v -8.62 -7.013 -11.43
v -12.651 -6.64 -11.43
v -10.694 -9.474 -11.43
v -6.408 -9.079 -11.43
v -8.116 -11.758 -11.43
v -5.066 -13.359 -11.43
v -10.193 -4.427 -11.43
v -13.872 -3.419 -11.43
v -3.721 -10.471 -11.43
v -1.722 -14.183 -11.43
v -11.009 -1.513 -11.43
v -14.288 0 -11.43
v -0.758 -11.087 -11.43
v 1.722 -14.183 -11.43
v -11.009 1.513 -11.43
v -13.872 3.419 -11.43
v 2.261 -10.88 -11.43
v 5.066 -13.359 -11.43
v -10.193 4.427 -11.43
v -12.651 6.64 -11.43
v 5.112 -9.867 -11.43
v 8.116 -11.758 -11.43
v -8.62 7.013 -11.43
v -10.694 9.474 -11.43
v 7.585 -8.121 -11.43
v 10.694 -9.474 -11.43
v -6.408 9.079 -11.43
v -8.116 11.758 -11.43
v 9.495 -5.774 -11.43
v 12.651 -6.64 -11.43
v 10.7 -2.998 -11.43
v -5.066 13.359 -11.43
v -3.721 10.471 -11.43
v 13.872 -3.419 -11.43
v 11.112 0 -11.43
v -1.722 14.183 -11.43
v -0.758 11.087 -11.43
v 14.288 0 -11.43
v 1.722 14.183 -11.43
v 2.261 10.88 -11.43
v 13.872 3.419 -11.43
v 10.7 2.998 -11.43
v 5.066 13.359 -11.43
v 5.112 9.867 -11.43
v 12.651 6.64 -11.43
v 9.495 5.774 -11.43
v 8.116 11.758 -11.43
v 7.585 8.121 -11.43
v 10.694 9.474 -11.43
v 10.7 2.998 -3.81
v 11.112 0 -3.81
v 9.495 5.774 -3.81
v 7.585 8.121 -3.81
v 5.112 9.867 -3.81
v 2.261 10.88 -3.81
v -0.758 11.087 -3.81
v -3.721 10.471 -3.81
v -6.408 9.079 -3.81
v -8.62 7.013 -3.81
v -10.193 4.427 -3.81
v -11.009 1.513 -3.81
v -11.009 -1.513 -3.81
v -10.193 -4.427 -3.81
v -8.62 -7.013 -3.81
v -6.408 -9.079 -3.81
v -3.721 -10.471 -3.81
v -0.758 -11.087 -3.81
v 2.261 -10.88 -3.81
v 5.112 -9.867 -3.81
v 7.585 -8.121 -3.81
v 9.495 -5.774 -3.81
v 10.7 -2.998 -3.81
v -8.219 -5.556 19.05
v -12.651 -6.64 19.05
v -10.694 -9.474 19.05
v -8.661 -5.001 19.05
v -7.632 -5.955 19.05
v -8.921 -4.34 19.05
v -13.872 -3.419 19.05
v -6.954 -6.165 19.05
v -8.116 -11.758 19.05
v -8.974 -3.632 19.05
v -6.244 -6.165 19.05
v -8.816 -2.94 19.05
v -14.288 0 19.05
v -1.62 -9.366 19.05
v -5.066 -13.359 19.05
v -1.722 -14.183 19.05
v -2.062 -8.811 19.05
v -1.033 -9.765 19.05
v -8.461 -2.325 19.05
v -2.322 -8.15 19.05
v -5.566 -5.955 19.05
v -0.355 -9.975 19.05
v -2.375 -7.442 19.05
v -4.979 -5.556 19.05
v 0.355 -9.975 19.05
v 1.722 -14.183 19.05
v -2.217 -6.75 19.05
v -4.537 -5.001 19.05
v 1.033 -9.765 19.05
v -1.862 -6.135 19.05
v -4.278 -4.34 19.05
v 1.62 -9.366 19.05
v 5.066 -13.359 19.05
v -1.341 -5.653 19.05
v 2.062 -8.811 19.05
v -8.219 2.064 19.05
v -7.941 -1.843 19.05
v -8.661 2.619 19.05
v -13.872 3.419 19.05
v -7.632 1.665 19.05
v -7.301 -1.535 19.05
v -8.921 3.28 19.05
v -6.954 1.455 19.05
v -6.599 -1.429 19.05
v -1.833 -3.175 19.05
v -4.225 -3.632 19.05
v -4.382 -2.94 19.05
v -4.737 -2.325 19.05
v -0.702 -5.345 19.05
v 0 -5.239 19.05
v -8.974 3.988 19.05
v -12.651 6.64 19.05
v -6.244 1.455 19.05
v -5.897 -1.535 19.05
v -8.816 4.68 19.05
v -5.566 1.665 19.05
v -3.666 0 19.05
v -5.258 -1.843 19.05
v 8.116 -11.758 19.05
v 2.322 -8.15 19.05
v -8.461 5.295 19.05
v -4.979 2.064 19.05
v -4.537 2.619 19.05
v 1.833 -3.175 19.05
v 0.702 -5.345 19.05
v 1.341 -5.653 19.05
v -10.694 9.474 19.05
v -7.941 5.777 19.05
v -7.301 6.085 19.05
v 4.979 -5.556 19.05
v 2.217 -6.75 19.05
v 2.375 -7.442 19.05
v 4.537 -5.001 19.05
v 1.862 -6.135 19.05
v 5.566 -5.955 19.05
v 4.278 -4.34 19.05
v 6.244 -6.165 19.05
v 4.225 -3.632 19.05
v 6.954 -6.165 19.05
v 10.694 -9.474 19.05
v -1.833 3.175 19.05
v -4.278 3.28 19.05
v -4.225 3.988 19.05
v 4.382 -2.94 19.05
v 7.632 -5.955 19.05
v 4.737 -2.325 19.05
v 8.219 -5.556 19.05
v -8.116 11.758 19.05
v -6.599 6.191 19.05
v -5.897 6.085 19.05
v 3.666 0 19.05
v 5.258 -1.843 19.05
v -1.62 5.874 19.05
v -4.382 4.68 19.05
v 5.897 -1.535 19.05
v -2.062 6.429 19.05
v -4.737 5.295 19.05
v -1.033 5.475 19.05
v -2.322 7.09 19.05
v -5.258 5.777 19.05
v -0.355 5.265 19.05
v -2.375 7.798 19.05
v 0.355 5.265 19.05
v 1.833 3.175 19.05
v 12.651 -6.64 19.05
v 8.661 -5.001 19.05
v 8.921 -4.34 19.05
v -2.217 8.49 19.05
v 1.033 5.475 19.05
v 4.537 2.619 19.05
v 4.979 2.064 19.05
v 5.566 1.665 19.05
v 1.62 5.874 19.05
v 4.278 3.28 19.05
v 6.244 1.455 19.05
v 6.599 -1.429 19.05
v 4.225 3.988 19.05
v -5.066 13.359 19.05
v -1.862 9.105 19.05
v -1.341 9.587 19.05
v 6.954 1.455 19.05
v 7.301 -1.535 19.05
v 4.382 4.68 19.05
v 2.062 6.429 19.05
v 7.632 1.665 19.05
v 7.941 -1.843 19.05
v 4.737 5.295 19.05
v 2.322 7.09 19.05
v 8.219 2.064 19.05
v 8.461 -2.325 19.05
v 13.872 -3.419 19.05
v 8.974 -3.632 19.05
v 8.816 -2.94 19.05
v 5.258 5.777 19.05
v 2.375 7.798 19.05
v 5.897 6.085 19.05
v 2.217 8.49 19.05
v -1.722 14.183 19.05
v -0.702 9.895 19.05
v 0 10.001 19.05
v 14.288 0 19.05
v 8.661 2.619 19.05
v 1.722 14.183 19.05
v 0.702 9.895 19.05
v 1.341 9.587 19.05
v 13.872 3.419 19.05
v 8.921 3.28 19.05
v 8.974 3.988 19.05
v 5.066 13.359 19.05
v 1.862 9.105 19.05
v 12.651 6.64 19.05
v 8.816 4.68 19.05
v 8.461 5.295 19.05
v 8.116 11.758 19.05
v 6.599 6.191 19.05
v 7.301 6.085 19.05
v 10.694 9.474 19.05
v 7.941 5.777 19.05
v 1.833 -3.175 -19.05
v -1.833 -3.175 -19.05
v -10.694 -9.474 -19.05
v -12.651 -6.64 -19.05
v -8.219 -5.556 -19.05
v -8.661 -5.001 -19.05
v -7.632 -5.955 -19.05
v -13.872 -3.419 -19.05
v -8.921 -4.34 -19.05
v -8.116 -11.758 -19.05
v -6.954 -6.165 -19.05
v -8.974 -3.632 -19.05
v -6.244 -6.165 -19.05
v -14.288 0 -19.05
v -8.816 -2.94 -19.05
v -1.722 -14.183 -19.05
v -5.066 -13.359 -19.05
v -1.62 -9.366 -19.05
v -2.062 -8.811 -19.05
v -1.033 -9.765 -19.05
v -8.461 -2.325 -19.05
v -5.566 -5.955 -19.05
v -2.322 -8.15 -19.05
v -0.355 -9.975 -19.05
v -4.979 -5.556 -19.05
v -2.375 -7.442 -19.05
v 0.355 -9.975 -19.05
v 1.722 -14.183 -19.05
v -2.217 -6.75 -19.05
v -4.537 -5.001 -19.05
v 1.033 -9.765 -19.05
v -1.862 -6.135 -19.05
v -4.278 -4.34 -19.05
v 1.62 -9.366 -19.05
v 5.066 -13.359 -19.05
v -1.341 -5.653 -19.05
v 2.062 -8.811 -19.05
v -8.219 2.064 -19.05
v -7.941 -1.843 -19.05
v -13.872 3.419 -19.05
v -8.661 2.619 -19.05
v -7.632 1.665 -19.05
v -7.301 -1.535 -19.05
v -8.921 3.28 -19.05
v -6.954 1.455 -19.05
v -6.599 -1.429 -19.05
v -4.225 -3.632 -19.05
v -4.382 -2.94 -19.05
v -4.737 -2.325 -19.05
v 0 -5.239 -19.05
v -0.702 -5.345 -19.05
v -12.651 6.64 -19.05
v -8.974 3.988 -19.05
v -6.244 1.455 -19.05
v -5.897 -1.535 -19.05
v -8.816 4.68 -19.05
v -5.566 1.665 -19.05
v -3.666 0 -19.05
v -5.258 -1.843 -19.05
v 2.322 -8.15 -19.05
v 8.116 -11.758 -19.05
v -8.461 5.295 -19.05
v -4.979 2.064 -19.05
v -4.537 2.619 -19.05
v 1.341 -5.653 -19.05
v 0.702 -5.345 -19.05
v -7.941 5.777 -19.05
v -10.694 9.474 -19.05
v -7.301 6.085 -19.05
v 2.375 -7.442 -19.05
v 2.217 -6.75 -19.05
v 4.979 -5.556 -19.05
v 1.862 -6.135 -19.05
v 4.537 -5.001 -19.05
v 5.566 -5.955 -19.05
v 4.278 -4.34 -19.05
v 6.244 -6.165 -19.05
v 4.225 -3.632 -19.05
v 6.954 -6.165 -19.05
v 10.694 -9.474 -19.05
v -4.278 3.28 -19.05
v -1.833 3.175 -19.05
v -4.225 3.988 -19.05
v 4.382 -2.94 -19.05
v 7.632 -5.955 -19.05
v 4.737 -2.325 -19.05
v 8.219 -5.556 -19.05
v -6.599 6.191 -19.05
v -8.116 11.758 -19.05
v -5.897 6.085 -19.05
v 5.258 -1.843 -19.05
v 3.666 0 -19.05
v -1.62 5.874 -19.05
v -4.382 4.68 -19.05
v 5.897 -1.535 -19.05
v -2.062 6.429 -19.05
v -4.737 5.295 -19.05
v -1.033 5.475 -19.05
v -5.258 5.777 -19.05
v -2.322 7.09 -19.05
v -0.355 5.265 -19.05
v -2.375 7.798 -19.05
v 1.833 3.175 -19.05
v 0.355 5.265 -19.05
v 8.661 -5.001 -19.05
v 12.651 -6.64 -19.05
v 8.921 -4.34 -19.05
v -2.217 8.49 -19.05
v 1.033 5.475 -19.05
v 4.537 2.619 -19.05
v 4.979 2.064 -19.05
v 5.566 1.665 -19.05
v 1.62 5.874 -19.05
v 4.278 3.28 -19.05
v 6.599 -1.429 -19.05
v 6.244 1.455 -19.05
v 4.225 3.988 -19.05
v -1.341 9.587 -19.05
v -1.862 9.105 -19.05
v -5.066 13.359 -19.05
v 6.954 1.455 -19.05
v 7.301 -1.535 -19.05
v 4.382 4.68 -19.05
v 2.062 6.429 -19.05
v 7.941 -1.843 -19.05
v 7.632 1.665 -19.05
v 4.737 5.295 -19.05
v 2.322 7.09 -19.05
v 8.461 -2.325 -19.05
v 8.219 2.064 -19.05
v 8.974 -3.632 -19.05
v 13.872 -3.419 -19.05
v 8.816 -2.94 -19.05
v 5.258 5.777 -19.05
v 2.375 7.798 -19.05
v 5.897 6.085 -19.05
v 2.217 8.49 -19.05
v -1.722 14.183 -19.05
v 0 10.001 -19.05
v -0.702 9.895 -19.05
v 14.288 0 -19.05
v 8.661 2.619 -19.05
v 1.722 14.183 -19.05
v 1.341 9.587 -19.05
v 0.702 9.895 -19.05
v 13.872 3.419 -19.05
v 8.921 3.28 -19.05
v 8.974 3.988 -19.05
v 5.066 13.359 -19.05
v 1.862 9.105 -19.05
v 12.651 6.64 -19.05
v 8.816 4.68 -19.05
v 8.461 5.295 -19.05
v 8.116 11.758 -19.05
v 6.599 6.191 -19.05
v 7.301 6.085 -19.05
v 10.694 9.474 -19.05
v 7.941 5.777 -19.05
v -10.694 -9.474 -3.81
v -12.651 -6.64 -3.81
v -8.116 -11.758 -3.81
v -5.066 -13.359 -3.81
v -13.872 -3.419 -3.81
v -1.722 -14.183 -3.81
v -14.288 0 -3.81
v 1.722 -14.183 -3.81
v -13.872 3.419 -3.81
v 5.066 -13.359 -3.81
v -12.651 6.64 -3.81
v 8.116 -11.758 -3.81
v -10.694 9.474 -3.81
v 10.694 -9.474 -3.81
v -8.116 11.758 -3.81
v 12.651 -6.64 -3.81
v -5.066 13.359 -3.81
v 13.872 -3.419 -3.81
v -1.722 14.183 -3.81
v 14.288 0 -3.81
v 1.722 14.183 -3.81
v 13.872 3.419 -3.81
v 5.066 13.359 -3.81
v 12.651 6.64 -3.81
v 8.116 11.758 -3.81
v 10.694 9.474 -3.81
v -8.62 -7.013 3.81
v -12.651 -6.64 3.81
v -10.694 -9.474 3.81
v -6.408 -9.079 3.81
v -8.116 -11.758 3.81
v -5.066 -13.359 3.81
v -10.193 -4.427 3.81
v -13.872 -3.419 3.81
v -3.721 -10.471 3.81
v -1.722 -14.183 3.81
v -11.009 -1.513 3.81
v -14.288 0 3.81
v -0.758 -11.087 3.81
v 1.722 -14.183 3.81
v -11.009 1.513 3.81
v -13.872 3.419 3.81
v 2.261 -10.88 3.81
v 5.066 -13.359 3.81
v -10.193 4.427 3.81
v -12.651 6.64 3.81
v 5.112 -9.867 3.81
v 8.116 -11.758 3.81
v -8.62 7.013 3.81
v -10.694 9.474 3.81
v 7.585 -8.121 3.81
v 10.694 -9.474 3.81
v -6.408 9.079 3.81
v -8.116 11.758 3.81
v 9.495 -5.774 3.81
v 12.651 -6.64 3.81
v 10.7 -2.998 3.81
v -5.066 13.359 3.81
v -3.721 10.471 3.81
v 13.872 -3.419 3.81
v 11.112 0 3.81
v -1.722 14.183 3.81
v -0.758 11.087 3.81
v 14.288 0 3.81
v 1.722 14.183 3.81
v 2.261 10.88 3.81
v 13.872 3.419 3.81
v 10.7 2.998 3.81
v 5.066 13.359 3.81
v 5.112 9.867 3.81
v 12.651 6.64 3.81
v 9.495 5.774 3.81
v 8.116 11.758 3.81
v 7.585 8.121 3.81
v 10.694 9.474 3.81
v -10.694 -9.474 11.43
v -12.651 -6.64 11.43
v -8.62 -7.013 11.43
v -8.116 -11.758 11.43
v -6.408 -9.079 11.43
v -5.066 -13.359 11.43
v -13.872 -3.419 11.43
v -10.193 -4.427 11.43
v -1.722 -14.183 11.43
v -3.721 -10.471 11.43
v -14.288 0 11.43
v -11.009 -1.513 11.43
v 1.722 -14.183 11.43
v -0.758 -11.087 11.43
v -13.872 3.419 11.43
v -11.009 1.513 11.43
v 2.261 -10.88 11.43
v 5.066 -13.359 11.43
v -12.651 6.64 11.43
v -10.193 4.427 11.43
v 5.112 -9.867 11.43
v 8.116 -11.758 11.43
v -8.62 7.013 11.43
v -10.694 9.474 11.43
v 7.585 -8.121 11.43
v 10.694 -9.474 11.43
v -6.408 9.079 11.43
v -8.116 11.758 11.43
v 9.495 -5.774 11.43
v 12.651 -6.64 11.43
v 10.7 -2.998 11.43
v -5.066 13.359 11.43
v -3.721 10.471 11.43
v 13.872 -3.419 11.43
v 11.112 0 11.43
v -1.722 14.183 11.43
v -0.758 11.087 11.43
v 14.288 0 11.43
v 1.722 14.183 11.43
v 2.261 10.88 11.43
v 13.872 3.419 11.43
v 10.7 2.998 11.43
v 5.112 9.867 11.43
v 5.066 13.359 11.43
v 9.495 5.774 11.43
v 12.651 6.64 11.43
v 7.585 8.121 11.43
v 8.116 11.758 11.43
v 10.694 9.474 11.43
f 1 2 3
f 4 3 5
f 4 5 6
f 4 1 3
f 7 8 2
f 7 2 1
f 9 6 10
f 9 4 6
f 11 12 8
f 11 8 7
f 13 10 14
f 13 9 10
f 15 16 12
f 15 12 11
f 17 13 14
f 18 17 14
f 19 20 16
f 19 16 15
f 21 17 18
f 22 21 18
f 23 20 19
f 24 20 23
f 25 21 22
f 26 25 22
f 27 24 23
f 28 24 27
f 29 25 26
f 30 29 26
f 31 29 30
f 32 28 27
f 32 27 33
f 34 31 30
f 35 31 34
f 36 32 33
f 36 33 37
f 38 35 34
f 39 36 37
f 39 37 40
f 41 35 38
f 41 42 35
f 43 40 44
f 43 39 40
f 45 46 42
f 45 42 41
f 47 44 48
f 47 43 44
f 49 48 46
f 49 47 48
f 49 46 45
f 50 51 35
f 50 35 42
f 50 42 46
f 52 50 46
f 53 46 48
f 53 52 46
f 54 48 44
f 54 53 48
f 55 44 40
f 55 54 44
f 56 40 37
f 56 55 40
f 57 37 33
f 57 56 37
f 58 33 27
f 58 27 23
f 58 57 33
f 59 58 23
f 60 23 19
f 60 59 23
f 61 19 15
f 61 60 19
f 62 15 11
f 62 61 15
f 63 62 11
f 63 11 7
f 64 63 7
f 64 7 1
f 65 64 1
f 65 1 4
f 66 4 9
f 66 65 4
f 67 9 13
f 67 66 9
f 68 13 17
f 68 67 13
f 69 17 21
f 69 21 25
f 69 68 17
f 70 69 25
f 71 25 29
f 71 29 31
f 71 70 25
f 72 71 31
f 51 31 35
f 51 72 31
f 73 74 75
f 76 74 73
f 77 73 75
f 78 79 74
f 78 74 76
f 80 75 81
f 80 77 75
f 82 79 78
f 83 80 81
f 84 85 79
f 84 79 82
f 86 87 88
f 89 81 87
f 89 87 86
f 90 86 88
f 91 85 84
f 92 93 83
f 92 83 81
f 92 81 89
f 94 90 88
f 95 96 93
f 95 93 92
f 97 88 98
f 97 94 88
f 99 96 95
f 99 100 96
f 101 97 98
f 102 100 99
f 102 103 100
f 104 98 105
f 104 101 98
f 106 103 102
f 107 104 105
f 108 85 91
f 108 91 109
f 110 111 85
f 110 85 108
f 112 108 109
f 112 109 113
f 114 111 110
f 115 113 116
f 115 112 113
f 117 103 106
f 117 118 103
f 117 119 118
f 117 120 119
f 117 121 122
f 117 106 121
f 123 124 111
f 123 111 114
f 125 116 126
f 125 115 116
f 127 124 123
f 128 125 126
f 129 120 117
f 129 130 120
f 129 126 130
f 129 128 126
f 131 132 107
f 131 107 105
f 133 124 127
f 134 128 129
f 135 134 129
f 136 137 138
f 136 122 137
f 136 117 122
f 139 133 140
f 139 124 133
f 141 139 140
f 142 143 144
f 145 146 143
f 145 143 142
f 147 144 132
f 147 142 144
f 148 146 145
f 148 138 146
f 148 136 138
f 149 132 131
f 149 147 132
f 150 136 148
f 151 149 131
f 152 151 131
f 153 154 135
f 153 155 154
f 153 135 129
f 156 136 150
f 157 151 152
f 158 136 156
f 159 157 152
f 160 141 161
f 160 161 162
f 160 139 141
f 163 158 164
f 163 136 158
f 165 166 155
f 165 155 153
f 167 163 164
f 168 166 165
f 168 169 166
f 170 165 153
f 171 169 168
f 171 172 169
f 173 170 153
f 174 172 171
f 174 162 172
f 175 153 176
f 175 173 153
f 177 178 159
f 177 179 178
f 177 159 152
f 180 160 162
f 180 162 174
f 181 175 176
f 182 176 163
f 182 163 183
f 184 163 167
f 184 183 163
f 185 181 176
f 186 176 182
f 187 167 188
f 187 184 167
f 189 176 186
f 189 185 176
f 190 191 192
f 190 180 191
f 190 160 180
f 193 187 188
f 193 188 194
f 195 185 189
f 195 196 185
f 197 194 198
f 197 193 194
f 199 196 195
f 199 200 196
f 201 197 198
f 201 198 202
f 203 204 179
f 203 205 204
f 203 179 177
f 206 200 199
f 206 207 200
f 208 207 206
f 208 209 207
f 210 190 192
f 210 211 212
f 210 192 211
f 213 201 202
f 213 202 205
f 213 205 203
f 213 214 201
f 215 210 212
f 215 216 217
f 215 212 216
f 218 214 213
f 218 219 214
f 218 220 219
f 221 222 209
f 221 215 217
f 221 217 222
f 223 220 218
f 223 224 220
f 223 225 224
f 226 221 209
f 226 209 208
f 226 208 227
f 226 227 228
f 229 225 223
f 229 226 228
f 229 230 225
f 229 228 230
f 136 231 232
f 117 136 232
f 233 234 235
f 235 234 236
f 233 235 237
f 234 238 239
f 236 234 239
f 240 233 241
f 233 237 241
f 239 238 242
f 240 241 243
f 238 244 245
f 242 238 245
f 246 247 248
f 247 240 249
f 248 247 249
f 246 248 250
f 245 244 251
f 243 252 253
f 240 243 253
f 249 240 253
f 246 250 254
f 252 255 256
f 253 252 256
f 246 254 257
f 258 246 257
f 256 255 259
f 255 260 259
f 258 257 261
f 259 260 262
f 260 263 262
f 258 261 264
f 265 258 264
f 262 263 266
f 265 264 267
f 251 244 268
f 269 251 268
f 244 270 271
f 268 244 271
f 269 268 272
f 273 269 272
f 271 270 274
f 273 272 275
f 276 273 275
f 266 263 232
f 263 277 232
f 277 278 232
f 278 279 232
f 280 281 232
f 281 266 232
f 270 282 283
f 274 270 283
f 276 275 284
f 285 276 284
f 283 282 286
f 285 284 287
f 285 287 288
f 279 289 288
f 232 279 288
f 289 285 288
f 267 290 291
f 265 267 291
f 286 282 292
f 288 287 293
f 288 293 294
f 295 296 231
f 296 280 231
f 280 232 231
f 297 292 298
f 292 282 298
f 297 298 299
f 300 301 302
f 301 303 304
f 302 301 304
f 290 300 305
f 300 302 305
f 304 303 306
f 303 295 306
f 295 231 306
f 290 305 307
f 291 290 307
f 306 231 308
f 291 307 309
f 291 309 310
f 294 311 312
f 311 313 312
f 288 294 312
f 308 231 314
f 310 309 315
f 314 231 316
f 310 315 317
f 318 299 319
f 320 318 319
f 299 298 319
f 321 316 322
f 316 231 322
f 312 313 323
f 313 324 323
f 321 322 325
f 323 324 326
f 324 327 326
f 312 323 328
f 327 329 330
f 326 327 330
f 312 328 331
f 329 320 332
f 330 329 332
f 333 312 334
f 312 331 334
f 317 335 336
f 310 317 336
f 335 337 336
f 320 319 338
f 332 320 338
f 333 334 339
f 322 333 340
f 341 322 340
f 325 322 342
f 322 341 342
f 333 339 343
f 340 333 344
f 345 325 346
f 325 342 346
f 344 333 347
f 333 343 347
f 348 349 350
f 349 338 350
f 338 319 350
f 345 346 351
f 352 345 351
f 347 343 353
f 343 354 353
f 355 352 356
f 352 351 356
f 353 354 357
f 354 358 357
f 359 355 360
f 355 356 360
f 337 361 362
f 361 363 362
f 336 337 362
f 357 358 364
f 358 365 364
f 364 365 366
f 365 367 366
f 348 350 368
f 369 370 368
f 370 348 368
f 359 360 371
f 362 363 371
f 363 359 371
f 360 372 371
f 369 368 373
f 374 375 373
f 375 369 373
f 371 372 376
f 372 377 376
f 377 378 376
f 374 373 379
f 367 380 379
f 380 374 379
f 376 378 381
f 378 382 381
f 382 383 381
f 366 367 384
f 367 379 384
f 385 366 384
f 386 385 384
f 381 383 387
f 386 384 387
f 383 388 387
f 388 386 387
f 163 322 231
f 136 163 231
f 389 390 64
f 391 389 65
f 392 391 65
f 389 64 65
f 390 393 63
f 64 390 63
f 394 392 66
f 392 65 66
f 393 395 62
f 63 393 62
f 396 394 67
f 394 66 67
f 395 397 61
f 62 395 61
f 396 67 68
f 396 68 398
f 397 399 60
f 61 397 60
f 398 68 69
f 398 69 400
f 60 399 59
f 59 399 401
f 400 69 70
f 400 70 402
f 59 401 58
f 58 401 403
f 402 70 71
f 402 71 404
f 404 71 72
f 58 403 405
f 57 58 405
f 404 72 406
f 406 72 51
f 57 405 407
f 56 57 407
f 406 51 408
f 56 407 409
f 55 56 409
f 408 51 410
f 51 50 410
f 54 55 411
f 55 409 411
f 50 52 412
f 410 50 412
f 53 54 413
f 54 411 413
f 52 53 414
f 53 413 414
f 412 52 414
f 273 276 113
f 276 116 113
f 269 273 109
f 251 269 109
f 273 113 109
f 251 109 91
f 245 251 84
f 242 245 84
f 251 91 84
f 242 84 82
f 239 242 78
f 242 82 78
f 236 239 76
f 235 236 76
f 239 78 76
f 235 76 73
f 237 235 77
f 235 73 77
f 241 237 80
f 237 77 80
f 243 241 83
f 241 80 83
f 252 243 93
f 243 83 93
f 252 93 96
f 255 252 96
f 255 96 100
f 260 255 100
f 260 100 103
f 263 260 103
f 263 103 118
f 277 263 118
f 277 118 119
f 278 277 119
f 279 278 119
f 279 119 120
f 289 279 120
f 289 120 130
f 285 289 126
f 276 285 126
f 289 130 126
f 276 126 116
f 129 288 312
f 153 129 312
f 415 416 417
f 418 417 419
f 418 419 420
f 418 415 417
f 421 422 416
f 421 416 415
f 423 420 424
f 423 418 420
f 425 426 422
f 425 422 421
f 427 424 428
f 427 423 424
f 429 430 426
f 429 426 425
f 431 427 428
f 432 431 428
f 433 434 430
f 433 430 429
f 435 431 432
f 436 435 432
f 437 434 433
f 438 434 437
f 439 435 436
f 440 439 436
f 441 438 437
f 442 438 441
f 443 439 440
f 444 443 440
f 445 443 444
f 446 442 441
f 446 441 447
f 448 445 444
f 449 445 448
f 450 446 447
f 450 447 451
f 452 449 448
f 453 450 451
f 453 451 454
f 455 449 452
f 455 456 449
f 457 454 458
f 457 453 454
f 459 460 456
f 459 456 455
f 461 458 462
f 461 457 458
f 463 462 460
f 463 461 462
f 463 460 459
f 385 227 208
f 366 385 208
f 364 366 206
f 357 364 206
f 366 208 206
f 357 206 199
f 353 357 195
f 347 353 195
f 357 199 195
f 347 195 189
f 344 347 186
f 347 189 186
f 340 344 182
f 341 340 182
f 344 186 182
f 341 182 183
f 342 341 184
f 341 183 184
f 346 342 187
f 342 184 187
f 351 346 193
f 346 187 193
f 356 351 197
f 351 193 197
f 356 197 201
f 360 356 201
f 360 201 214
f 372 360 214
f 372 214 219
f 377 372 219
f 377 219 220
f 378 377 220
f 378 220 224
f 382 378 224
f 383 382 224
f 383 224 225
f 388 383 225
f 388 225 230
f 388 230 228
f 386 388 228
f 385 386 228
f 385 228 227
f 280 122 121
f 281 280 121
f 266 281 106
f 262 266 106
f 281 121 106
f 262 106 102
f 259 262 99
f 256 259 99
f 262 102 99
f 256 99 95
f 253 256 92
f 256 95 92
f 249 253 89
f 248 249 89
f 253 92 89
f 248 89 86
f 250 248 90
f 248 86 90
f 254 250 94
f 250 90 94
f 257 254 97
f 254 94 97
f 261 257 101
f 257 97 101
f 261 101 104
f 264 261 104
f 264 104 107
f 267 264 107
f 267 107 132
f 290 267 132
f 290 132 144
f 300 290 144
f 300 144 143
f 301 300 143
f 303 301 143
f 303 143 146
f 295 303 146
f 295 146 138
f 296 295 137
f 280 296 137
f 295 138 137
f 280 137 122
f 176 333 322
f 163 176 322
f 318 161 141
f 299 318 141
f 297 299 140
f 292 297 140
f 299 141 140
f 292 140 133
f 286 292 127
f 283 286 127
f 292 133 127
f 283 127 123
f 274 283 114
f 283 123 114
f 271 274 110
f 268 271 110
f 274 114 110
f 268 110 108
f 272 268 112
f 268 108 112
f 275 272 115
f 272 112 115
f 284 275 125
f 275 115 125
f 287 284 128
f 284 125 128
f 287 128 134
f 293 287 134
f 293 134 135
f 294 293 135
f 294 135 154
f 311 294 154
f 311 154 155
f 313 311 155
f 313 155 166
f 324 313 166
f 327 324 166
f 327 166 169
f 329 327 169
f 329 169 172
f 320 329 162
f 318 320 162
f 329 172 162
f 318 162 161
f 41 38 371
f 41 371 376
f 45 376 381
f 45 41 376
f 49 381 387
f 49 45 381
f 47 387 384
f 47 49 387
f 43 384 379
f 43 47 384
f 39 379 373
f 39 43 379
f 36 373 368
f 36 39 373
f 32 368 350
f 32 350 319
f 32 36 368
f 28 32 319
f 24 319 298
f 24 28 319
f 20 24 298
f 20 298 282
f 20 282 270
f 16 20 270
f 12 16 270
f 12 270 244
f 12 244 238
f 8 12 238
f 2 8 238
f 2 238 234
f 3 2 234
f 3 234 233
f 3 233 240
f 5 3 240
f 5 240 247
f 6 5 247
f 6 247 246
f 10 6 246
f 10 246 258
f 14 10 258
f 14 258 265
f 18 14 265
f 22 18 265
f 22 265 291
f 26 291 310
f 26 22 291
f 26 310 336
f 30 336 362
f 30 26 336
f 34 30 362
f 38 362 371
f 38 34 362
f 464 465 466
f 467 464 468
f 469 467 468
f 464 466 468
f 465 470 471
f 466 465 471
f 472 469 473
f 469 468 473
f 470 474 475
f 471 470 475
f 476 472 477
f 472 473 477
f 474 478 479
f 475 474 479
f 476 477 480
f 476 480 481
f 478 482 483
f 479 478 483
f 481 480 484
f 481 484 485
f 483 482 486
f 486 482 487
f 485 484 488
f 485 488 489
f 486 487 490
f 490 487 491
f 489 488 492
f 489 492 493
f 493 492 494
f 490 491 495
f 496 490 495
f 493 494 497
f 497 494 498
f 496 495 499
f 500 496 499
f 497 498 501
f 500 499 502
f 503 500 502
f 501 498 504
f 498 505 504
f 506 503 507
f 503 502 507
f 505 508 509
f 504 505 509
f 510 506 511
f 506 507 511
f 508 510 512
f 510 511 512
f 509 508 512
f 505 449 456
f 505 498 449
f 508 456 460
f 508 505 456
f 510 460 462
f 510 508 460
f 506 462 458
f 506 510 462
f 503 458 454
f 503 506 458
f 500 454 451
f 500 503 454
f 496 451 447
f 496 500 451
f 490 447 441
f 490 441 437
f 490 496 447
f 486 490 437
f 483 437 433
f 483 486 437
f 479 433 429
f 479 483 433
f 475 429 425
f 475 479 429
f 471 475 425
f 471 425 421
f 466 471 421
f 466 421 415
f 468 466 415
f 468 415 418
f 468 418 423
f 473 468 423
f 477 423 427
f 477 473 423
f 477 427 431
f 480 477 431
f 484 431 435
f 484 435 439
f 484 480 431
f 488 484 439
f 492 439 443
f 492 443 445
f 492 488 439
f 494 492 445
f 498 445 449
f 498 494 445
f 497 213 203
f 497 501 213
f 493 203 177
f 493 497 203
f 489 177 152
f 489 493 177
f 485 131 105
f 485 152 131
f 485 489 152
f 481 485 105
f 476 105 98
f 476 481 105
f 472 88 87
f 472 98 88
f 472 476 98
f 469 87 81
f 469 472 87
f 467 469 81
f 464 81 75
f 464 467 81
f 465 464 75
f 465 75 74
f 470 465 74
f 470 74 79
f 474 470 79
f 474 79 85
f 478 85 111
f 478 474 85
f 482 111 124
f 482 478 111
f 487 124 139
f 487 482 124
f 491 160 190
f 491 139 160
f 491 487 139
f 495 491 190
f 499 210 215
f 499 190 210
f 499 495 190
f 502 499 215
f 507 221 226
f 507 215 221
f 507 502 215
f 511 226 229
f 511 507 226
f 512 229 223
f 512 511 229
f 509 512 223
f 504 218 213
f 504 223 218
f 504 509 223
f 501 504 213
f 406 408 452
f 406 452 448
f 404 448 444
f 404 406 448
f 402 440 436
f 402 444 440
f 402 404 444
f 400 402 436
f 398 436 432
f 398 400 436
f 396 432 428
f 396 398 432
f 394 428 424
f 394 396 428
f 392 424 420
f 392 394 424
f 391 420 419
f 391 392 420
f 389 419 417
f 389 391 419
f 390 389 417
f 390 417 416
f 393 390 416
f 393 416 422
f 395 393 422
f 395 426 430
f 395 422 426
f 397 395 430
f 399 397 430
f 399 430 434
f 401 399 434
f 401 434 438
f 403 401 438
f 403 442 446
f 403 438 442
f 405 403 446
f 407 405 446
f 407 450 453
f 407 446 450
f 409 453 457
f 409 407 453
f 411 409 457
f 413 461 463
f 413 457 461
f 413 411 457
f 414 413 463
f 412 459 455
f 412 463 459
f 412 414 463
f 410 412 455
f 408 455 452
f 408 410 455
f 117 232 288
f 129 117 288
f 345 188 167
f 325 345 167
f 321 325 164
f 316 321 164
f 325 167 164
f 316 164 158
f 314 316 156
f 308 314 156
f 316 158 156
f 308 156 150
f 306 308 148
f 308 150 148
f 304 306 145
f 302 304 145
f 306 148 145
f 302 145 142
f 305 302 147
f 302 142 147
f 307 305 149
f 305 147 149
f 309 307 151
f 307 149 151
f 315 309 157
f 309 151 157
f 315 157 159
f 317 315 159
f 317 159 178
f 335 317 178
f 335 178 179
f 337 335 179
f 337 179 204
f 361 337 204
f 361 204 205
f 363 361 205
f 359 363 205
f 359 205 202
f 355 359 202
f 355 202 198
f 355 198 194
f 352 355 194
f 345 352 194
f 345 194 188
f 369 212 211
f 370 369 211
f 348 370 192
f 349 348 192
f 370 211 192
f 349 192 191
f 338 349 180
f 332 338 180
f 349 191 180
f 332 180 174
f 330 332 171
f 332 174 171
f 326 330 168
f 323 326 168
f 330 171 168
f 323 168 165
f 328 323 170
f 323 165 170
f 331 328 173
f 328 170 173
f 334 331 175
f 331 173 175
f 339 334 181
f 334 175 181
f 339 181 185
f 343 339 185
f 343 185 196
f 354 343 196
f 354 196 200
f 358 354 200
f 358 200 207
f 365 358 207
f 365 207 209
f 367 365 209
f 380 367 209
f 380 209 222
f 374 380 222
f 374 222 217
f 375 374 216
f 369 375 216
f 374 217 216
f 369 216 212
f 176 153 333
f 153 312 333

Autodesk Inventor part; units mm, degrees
ref_plane "YZ Plane" through (0, 0, 0) normal (1, 0, 0) x (0, 1, 0)
ref_plane "XZ Plane" through (0, 0, 0) normal (0, 1, 0) x (-1, 0, 0)
sketch "Sketch1" plane through (0, 0, 0) normal (0, 0, 1) x (1, 0, 0)
  line L0 (-1.8331, 3.175) -> (1.8331, 3.175)
  line L1 (1.8331, 3.175) -> (3.6662, 0)
  line L2 (3.6662, 0) -> (1.8331, -3.175)
  line L3 (1.8331, -3.175) -> (-1.8331, -3.175)
  line L4 (-1.8331, -3.175) -> (-3.6662, 0)
  line L5 (-3.6662, 0) -> (-1.8331, 3.175)
  circle A0 centre (0, 0) radius 14.2875
  dimension "d1" = 6.35
  dimension "d4" = 28.575
extrude "Extrusion1" add sketch "Sketch1" along normal mid plane 38.1
ref_plane "Work Plane5" through (-2.7496, 1.5875, -11.43) normal (0, 0, 1) x (1, 0, 0)
ref_plane "Work Plane4" through (-2.7496, 1.5875, -3.81) normal (0, 0, 1) x (1, 0, 0)
sketch "Sketch2" plane through (-2.7496, 1.5875, 11.43) normal (0, 0, 1) x (1, 0, 0)
  circle A0 centre (2.7496, -1.5875) radius 11.1125
  circle A1 centre (2.7496, -1.5875) radius 14.2875 projected
  dimension "d9" = 22.225
extrude "Extrusion2" cut sketch "Sketch2" against normal blind 7.62
sketch "Sketch3" plane through (-2.7496, 1.5875, -3.81) normal (0, 0, 1) x (1, 0, 0)
  circle A0 centre (2.7496, -1.5875) radius 14.2875 projected
  circle A1 centre (2.7496, -1.5875) radius 11.1125 projected
  point P0 (2.7351, -1.6125)
sketch "Sketch4" plane through (0, 0, -19.05) normal (0, 0, -1) x (-1, 0, 0)
  circle A0 centre (0, 0) radius 14.2875 projected
  point P0 (0, 7.62)
  point P1 (-6.5991, 3.81)
  point P2 (-6.5991, -3.81)
  point P3 (0, -7.62)
  point P4 (6.5991, -3.81)
  point P5 (6.5991, 3.81)
  dimension "d15" = 7.62
  dimension "d18" = 360
hole "Hole1" at (0, 7.62, -19.05) at (6.5991, 3.81, -19.05) at (6.5991, -3.81, -19.05) at (0, -7.62, -19.05) at (-6.5991, -3.81, -19.05) at (-6.5991, 3.81, -19.05) direction (0, 0, 1) diameter 4.7625 end through all
extrude "Extrusion4" cut sketch "Sketch3" against normal blind 7.62
ref_plane "Work Plane1" through (-2.7496, 1.5875, 19.05) normal (0, 0, 1) x (1, 0, 0)
ref_plane "Work Plane2" through (-2.7496, 1.5875, 11.43) normal (0, 0, 1) x (1, 0, 0)
ref_plane "Work Plane3" through (-2.7496, 1.5875, 3.81) normal (0, 0, 1) x (1, 0, 0)
properties part number "WheelHub" material "Aluminum-6061"
